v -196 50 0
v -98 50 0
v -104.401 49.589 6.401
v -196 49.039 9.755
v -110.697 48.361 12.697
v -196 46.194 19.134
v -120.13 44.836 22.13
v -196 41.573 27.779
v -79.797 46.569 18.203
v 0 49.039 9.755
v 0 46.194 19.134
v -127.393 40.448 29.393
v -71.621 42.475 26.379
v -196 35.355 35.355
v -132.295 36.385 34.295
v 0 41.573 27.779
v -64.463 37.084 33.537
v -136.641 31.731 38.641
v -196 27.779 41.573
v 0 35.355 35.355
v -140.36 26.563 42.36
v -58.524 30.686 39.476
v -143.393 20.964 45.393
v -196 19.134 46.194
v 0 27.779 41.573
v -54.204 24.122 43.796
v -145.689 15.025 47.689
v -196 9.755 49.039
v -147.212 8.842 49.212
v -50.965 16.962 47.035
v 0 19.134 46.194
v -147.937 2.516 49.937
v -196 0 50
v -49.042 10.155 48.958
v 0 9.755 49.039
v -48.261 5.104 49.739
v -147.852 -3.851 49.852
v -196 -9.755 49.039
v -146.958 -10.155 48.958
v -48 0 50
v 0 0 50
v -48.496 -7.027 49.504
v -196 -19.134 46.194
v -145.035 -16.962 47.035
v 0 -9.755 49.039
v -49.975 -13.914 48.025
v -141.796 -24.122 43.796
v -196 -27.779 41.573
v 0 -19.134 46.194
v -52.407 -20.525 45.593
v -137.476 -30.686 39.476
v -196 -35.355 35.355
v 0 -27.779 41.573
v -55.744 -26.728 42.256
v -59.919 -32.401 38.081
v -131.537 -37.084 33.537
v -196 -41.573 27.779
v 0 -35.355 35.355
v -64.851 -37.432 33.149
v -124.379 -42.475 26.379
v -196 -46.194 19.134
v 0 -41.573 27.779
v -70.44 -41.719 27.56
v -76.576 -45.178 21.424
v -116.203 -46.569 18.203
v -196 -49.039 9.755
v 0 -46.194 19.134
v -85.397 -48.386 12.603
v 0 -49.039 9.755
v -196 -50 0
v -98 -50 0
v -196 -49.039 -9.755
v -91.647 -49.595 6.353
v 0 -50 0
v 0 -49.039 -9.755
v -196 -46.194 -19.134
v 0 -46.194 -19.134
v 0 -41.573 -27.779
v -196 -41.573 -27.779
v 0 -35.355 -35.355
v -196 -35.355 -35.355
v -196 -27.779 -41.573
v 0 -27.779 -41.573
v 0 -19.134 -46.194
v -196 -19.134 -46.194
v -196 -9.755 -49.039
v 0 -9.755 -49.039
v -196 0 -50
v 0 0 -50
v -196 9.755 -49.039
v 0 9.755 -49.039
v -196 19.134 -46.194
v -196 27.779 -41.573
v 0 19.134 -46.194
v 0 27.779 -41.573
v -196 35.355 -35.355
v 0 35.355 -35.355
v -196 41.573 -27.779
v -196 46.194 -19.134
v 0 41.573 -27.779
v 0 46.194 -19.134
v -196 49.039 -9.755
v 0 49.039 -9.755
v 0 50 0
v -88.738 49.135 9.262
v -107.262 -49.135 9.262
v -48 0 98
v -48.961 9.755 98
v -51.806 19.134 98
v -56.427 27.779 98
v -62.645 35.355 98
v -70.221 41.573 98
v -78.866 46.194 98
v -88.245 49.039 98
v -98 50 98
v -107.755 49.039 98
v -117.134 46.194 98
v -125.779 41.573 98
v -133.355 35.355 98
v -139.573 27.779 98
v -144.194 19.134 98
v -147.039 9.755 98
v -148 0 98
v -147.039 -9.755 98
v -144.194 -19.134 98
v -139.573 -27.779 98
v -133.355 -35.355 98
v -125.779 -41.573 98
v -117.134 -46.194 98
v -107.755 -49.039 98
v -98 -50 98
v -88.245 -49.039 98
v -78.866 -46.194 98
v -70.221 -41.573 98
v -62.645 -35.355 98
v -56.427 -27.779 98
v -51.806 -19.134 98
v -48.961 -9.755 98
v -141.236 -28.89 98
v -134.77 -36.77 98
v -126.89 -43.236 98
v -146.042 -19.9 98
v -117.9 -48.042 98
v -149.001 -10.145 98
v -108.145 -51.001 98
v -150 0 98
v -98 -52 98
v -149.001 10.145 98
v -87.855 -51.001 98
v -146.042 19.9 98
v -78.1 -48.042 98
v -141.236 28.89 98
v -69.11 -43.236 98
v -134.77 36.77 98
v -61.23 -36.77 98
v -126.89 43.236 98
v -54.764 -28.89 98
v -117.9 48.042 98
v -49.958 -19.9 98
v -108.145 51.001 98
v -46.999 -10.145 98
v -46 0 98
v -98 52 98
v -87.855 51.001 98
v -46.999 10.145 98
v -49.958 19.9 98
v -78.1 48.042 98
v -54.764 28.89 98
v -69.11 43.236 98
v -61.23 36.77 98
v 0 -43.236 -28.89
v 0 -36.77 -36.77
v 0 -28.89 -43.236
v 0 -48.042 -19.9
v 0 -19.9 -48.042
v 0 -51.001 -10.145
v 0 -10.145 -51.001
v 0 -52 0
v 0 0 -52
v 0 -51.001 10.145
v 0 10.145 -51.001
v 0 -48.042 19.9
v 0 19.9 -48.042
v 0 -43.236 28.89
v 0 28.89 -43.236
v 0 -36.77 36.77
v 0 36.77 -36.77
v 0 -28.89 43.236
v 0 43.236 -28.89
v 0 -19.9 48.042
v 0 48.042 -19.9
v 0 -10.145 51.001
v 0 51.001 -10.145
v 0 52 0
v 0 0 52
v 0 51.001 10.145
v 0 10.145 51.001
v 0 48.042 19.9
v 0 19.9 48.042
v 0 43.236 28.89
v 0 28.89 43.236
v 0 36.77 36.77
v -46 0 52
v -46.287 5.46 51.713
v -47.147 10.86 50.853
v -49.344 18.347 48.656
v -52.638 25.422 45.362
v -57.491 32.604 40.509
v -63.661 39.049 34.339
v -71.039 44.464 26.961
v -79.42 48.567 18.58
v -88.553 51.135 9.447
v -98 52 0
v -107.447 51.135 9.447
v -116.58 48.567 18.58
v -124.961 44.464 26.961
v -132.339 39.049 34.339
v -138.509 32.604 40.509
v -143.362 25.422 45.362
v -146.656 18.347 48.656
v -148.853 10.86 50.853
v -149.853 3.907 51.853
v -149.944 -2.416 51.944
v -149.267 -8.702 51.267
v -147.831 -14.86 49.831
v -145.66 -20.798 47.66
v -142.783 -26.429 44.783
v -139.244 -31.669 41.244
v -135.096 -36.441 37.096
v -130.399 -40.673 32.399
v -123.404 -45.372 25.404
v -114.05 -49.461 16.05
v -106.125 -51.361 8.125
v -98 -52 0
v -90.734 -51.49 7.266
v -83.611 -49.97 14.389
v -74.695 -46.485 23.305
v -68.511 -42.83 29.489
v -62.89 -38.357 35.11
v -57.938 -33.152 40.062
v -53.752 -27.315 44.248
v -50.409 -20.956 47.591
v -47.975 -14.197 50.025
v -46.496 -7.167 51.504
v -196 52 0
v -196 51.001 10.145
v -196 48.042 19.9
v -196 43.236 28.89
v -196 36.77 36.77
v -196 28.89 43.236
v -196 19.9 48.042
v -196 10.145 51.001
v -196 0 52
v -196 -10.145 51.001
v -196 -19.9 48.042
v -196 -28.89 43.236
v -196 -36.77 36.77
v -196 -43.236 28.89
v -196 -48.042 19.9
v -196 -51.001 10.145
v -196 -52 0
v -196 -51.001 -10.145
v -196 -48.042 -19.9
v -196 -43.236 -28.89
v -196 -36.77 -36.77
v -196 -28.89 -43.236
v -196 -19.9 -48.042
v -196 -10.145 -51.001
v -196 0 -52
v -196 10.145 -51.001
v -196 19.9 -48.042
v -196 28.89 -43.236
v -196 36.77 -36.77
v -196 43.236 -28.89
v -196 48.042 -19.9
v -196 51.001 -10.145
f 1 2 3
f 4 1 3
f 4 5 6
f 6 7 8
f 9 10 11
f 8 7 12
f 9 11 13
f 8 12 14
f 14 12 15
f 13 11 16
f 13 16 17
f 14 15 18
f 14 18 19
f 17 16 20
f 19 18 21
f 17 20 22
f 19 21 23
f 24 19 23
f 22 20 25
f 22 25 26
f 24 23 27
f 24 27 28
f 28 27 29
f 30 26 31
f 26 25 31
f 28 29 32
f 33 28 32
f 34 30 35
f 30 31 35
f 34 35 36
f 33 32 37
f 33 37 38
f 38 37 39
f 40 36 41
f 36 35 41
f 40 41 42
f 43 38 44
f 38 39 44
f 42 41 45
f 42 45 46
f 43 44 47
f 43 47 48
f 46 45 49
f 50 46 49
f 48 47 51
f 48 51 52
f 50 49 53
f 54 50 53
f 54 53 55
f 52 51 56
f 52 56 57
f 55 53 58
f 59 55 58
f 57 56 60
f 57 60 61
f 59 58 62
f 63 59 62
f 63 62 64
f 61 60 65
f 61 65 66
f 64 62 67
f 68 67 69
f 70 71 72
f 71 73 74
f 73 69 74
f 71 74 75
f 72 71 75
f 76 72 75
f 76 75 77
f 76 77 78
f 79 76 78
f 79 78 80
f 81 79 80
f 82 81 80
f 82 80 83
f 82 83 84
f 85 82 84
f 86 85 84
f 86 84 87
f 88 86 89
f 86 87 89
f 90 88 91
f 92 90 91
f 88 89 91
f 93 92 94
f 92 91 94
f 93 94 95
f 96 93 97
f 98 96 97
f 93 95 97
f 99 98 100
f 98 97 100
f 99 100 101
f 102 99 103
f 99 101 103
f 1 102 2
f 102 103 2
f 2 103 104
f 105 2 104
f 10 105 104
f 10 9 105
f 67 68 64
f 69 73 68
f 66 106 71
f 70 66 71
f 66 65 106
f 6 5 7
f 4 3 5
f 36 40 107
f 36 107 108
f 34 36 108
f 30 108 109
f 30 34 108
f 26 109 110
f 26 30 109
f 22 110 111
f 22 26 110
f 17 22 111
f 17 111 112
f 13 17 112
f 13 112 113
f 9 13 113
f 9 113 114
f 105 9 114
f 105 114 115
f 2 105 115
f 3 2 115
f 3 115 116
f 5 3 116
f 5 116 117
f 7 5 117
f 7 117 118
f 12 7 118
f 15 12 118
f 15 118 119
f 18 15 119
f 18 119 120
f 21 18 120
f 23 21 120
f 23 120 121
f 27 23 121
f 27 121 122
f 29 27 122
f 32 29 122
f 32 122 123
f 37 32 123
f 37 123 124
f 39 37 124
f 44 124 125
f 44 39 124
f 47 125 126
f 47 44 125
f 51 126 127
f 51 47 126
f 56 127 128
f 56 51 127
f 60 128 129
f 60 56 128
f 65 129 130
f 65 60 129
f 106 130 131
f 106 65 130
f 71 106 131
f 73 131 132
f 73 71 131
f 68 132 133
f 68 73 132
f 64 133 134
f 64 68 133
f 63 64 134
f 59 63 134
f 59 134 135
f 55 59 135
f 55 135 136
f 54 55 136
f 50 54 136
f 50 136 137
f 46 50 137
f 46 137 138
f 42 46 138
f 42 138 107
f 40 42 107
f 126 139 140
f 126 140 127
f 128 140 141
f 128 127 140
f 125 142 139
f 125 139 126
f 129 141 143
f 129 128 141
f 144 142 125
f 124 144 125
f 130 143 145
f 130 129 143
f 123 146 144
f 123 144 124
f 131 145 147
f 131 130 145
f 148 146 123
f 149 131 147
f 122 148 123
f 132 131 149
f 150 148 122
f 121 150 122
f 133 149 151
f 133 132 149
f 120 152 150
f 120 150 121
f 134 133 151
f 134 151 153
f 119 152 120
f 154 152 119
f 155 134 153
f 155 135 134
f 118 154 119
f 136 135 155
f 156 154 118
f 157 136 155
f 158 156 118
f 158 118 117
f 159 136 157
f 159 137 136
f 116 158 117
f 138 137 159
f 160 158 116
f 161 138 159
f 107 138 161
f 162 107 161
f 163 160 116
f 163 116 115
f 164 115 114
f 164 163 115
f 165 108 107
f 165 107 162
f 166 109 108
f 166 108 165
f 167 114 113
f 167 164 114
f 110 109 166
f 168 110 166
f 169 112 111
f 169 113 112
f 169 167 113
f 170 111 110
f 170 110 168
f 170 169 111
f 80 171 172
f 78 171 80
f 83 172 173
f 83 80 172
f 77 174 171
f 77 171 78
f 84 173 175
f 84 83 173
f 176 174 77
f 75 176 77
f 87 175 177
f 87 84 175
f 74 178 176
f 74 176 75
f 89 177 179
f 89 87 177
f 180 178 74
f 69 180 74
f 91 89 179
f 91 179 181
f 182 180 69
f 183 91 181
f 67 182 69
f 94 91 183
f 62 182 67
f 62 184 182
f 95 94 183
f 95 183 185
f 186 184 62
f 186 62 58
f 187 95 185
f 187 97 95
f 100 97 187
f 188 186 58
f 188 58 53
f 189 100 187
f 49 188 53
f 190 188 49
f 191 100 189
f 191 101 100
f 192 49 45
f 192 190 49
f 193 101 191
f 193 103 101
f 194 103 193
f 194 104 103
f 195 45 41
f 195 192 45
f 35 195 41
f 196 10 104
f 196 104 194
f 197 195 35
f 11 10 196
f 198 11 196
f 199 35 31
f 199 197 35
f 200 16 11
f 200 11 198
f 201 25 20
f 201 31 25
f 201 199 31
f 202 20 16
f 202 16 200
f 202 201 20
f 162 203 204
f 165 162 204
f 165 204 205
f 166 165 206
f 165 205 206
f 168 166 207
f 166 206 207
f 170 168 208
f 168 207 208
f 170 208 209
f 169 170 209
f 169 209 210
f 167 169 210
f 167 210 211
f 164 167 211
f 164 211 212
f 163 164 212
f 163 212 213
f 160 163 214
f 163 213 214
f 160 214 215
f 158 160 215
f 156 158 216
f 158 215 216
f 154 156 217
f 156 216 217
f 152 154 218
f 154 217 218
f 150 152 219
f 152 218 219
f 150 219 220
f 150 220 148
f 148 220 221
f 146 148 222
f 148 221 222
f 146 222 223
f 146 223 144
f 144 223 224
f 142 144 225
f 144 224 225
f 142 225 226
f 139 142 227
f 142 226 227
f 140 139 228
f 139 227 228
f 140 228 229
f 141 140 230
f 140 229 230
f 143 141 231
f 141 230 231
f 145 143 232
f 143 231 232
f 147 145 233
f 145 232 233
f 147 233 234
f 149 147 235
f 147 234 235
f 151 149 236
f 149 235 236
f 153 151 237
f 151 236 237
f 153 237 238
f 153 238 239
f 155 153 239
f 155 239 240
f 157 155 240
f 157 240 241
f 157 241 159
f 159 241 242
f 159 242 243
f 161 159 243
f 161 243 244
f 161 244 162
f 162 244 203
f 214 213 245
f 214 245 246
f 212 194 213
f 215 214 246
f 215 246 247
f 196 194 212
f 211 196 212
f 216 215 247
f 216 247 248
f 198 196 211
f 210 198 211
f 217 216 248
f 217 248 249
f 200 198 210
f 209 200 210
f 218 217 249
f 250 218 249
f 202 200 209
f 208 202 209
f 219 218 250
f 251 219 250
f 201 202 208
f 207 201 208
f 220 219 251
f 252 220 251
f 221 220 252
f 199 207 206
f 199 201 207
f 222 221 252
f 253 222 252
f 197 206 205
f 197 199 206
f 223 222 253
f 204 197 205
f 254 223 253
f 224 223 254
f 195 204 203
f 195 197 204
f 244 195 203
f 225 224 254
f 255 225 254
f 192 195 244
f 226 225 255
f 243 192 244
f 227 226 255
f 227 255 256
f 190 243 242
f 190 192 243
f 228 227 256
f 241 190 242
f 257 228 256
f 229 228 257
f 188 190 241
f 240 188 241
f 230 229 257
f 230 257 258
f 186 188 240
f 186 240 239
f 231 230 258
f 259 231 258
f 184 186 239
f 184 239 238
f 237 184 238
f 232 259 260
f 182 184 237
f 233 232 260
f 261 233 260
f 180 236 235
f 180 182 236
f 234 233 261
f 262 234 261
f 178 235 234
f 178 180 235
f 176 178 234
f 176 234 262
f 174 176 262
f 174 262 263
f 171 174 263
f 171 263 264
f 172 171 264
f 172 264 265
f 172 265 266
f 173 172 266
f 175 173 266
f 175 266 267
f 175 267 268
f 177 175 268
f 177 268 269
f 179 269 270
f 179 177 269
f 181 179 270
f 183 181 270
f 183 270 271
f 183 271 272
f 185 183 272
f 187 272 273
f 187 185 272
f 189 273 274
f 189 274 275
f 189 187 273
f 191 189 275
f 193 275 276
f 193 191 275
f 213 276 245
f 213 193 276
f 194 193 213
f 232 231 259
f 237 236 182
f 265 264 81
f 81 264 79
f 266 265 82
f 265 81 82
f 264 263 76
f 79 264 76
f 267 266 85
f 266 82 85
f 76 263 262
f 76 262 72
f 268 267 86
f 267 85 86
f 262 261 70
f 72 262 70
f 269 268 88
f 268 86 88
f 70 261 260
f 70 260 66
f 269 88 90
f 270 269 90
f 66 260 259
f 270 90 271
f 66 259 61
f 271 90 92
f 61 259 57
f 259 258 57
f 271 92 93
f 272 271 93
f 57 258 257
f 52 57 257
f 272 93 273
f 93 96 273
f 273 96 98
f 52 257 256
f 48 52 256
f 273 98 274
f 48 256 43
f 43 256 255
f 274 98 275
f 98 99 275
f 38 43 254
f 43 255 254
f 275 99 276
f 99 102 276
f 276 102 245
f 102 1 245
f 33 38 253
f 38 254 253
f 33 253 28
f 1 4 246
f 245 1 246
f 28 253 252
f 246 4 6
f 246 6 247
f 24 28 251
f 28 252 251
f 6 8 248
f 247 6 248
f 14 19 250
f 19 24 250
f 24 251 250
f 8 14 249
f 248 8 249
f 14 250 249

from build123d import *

# Parameters (mm, degrees)
F0_R     = 52
F0_R_2   = 50
F2_DEPTH = 196
F1_R     = 52
F1_R_2   = 50
F3_DEPTH = 98
F4_DEPTH = 78
F5_DEPTH = 188


with BuildPart() as f2:
    # F0 (on Right) → F2 (new body)
    with BuildSketch(Plane.YZ):
        Circle(F0_R)
        Circle(F0_R_2, mode=Mode.SUBTRACT)
    extrude(amount=-F2_DEPTH)

    # F1 (on Top) → F3 (join)
    with BuildSketch(Plane.XY):
        with Locations((-98, 0)):
            Circle(F1_R)
        with Locations((-98, 0)):
            Circle(F1_R_2, mode=Mode.SUBTRACT)
    extrude(amount=F3_DEPTH)

    # F1 (on Top) → F4 (cut)
    with BuildSketch(Plane.XY):
        with Locations((-98, 0)):
            Circle(F1_R_2)
    extrude(amount=F4_DEPTH, mode=Mode.SUBTRACT)

    # F0 (on Right) → F5 (cut)
    with BuildSketch(Plane.YZ):
        Circle(F0_R_2)
    extrude(amount=-F5_DEPTH, mode=Mode.SUBTRACT)


solid = f2.part
